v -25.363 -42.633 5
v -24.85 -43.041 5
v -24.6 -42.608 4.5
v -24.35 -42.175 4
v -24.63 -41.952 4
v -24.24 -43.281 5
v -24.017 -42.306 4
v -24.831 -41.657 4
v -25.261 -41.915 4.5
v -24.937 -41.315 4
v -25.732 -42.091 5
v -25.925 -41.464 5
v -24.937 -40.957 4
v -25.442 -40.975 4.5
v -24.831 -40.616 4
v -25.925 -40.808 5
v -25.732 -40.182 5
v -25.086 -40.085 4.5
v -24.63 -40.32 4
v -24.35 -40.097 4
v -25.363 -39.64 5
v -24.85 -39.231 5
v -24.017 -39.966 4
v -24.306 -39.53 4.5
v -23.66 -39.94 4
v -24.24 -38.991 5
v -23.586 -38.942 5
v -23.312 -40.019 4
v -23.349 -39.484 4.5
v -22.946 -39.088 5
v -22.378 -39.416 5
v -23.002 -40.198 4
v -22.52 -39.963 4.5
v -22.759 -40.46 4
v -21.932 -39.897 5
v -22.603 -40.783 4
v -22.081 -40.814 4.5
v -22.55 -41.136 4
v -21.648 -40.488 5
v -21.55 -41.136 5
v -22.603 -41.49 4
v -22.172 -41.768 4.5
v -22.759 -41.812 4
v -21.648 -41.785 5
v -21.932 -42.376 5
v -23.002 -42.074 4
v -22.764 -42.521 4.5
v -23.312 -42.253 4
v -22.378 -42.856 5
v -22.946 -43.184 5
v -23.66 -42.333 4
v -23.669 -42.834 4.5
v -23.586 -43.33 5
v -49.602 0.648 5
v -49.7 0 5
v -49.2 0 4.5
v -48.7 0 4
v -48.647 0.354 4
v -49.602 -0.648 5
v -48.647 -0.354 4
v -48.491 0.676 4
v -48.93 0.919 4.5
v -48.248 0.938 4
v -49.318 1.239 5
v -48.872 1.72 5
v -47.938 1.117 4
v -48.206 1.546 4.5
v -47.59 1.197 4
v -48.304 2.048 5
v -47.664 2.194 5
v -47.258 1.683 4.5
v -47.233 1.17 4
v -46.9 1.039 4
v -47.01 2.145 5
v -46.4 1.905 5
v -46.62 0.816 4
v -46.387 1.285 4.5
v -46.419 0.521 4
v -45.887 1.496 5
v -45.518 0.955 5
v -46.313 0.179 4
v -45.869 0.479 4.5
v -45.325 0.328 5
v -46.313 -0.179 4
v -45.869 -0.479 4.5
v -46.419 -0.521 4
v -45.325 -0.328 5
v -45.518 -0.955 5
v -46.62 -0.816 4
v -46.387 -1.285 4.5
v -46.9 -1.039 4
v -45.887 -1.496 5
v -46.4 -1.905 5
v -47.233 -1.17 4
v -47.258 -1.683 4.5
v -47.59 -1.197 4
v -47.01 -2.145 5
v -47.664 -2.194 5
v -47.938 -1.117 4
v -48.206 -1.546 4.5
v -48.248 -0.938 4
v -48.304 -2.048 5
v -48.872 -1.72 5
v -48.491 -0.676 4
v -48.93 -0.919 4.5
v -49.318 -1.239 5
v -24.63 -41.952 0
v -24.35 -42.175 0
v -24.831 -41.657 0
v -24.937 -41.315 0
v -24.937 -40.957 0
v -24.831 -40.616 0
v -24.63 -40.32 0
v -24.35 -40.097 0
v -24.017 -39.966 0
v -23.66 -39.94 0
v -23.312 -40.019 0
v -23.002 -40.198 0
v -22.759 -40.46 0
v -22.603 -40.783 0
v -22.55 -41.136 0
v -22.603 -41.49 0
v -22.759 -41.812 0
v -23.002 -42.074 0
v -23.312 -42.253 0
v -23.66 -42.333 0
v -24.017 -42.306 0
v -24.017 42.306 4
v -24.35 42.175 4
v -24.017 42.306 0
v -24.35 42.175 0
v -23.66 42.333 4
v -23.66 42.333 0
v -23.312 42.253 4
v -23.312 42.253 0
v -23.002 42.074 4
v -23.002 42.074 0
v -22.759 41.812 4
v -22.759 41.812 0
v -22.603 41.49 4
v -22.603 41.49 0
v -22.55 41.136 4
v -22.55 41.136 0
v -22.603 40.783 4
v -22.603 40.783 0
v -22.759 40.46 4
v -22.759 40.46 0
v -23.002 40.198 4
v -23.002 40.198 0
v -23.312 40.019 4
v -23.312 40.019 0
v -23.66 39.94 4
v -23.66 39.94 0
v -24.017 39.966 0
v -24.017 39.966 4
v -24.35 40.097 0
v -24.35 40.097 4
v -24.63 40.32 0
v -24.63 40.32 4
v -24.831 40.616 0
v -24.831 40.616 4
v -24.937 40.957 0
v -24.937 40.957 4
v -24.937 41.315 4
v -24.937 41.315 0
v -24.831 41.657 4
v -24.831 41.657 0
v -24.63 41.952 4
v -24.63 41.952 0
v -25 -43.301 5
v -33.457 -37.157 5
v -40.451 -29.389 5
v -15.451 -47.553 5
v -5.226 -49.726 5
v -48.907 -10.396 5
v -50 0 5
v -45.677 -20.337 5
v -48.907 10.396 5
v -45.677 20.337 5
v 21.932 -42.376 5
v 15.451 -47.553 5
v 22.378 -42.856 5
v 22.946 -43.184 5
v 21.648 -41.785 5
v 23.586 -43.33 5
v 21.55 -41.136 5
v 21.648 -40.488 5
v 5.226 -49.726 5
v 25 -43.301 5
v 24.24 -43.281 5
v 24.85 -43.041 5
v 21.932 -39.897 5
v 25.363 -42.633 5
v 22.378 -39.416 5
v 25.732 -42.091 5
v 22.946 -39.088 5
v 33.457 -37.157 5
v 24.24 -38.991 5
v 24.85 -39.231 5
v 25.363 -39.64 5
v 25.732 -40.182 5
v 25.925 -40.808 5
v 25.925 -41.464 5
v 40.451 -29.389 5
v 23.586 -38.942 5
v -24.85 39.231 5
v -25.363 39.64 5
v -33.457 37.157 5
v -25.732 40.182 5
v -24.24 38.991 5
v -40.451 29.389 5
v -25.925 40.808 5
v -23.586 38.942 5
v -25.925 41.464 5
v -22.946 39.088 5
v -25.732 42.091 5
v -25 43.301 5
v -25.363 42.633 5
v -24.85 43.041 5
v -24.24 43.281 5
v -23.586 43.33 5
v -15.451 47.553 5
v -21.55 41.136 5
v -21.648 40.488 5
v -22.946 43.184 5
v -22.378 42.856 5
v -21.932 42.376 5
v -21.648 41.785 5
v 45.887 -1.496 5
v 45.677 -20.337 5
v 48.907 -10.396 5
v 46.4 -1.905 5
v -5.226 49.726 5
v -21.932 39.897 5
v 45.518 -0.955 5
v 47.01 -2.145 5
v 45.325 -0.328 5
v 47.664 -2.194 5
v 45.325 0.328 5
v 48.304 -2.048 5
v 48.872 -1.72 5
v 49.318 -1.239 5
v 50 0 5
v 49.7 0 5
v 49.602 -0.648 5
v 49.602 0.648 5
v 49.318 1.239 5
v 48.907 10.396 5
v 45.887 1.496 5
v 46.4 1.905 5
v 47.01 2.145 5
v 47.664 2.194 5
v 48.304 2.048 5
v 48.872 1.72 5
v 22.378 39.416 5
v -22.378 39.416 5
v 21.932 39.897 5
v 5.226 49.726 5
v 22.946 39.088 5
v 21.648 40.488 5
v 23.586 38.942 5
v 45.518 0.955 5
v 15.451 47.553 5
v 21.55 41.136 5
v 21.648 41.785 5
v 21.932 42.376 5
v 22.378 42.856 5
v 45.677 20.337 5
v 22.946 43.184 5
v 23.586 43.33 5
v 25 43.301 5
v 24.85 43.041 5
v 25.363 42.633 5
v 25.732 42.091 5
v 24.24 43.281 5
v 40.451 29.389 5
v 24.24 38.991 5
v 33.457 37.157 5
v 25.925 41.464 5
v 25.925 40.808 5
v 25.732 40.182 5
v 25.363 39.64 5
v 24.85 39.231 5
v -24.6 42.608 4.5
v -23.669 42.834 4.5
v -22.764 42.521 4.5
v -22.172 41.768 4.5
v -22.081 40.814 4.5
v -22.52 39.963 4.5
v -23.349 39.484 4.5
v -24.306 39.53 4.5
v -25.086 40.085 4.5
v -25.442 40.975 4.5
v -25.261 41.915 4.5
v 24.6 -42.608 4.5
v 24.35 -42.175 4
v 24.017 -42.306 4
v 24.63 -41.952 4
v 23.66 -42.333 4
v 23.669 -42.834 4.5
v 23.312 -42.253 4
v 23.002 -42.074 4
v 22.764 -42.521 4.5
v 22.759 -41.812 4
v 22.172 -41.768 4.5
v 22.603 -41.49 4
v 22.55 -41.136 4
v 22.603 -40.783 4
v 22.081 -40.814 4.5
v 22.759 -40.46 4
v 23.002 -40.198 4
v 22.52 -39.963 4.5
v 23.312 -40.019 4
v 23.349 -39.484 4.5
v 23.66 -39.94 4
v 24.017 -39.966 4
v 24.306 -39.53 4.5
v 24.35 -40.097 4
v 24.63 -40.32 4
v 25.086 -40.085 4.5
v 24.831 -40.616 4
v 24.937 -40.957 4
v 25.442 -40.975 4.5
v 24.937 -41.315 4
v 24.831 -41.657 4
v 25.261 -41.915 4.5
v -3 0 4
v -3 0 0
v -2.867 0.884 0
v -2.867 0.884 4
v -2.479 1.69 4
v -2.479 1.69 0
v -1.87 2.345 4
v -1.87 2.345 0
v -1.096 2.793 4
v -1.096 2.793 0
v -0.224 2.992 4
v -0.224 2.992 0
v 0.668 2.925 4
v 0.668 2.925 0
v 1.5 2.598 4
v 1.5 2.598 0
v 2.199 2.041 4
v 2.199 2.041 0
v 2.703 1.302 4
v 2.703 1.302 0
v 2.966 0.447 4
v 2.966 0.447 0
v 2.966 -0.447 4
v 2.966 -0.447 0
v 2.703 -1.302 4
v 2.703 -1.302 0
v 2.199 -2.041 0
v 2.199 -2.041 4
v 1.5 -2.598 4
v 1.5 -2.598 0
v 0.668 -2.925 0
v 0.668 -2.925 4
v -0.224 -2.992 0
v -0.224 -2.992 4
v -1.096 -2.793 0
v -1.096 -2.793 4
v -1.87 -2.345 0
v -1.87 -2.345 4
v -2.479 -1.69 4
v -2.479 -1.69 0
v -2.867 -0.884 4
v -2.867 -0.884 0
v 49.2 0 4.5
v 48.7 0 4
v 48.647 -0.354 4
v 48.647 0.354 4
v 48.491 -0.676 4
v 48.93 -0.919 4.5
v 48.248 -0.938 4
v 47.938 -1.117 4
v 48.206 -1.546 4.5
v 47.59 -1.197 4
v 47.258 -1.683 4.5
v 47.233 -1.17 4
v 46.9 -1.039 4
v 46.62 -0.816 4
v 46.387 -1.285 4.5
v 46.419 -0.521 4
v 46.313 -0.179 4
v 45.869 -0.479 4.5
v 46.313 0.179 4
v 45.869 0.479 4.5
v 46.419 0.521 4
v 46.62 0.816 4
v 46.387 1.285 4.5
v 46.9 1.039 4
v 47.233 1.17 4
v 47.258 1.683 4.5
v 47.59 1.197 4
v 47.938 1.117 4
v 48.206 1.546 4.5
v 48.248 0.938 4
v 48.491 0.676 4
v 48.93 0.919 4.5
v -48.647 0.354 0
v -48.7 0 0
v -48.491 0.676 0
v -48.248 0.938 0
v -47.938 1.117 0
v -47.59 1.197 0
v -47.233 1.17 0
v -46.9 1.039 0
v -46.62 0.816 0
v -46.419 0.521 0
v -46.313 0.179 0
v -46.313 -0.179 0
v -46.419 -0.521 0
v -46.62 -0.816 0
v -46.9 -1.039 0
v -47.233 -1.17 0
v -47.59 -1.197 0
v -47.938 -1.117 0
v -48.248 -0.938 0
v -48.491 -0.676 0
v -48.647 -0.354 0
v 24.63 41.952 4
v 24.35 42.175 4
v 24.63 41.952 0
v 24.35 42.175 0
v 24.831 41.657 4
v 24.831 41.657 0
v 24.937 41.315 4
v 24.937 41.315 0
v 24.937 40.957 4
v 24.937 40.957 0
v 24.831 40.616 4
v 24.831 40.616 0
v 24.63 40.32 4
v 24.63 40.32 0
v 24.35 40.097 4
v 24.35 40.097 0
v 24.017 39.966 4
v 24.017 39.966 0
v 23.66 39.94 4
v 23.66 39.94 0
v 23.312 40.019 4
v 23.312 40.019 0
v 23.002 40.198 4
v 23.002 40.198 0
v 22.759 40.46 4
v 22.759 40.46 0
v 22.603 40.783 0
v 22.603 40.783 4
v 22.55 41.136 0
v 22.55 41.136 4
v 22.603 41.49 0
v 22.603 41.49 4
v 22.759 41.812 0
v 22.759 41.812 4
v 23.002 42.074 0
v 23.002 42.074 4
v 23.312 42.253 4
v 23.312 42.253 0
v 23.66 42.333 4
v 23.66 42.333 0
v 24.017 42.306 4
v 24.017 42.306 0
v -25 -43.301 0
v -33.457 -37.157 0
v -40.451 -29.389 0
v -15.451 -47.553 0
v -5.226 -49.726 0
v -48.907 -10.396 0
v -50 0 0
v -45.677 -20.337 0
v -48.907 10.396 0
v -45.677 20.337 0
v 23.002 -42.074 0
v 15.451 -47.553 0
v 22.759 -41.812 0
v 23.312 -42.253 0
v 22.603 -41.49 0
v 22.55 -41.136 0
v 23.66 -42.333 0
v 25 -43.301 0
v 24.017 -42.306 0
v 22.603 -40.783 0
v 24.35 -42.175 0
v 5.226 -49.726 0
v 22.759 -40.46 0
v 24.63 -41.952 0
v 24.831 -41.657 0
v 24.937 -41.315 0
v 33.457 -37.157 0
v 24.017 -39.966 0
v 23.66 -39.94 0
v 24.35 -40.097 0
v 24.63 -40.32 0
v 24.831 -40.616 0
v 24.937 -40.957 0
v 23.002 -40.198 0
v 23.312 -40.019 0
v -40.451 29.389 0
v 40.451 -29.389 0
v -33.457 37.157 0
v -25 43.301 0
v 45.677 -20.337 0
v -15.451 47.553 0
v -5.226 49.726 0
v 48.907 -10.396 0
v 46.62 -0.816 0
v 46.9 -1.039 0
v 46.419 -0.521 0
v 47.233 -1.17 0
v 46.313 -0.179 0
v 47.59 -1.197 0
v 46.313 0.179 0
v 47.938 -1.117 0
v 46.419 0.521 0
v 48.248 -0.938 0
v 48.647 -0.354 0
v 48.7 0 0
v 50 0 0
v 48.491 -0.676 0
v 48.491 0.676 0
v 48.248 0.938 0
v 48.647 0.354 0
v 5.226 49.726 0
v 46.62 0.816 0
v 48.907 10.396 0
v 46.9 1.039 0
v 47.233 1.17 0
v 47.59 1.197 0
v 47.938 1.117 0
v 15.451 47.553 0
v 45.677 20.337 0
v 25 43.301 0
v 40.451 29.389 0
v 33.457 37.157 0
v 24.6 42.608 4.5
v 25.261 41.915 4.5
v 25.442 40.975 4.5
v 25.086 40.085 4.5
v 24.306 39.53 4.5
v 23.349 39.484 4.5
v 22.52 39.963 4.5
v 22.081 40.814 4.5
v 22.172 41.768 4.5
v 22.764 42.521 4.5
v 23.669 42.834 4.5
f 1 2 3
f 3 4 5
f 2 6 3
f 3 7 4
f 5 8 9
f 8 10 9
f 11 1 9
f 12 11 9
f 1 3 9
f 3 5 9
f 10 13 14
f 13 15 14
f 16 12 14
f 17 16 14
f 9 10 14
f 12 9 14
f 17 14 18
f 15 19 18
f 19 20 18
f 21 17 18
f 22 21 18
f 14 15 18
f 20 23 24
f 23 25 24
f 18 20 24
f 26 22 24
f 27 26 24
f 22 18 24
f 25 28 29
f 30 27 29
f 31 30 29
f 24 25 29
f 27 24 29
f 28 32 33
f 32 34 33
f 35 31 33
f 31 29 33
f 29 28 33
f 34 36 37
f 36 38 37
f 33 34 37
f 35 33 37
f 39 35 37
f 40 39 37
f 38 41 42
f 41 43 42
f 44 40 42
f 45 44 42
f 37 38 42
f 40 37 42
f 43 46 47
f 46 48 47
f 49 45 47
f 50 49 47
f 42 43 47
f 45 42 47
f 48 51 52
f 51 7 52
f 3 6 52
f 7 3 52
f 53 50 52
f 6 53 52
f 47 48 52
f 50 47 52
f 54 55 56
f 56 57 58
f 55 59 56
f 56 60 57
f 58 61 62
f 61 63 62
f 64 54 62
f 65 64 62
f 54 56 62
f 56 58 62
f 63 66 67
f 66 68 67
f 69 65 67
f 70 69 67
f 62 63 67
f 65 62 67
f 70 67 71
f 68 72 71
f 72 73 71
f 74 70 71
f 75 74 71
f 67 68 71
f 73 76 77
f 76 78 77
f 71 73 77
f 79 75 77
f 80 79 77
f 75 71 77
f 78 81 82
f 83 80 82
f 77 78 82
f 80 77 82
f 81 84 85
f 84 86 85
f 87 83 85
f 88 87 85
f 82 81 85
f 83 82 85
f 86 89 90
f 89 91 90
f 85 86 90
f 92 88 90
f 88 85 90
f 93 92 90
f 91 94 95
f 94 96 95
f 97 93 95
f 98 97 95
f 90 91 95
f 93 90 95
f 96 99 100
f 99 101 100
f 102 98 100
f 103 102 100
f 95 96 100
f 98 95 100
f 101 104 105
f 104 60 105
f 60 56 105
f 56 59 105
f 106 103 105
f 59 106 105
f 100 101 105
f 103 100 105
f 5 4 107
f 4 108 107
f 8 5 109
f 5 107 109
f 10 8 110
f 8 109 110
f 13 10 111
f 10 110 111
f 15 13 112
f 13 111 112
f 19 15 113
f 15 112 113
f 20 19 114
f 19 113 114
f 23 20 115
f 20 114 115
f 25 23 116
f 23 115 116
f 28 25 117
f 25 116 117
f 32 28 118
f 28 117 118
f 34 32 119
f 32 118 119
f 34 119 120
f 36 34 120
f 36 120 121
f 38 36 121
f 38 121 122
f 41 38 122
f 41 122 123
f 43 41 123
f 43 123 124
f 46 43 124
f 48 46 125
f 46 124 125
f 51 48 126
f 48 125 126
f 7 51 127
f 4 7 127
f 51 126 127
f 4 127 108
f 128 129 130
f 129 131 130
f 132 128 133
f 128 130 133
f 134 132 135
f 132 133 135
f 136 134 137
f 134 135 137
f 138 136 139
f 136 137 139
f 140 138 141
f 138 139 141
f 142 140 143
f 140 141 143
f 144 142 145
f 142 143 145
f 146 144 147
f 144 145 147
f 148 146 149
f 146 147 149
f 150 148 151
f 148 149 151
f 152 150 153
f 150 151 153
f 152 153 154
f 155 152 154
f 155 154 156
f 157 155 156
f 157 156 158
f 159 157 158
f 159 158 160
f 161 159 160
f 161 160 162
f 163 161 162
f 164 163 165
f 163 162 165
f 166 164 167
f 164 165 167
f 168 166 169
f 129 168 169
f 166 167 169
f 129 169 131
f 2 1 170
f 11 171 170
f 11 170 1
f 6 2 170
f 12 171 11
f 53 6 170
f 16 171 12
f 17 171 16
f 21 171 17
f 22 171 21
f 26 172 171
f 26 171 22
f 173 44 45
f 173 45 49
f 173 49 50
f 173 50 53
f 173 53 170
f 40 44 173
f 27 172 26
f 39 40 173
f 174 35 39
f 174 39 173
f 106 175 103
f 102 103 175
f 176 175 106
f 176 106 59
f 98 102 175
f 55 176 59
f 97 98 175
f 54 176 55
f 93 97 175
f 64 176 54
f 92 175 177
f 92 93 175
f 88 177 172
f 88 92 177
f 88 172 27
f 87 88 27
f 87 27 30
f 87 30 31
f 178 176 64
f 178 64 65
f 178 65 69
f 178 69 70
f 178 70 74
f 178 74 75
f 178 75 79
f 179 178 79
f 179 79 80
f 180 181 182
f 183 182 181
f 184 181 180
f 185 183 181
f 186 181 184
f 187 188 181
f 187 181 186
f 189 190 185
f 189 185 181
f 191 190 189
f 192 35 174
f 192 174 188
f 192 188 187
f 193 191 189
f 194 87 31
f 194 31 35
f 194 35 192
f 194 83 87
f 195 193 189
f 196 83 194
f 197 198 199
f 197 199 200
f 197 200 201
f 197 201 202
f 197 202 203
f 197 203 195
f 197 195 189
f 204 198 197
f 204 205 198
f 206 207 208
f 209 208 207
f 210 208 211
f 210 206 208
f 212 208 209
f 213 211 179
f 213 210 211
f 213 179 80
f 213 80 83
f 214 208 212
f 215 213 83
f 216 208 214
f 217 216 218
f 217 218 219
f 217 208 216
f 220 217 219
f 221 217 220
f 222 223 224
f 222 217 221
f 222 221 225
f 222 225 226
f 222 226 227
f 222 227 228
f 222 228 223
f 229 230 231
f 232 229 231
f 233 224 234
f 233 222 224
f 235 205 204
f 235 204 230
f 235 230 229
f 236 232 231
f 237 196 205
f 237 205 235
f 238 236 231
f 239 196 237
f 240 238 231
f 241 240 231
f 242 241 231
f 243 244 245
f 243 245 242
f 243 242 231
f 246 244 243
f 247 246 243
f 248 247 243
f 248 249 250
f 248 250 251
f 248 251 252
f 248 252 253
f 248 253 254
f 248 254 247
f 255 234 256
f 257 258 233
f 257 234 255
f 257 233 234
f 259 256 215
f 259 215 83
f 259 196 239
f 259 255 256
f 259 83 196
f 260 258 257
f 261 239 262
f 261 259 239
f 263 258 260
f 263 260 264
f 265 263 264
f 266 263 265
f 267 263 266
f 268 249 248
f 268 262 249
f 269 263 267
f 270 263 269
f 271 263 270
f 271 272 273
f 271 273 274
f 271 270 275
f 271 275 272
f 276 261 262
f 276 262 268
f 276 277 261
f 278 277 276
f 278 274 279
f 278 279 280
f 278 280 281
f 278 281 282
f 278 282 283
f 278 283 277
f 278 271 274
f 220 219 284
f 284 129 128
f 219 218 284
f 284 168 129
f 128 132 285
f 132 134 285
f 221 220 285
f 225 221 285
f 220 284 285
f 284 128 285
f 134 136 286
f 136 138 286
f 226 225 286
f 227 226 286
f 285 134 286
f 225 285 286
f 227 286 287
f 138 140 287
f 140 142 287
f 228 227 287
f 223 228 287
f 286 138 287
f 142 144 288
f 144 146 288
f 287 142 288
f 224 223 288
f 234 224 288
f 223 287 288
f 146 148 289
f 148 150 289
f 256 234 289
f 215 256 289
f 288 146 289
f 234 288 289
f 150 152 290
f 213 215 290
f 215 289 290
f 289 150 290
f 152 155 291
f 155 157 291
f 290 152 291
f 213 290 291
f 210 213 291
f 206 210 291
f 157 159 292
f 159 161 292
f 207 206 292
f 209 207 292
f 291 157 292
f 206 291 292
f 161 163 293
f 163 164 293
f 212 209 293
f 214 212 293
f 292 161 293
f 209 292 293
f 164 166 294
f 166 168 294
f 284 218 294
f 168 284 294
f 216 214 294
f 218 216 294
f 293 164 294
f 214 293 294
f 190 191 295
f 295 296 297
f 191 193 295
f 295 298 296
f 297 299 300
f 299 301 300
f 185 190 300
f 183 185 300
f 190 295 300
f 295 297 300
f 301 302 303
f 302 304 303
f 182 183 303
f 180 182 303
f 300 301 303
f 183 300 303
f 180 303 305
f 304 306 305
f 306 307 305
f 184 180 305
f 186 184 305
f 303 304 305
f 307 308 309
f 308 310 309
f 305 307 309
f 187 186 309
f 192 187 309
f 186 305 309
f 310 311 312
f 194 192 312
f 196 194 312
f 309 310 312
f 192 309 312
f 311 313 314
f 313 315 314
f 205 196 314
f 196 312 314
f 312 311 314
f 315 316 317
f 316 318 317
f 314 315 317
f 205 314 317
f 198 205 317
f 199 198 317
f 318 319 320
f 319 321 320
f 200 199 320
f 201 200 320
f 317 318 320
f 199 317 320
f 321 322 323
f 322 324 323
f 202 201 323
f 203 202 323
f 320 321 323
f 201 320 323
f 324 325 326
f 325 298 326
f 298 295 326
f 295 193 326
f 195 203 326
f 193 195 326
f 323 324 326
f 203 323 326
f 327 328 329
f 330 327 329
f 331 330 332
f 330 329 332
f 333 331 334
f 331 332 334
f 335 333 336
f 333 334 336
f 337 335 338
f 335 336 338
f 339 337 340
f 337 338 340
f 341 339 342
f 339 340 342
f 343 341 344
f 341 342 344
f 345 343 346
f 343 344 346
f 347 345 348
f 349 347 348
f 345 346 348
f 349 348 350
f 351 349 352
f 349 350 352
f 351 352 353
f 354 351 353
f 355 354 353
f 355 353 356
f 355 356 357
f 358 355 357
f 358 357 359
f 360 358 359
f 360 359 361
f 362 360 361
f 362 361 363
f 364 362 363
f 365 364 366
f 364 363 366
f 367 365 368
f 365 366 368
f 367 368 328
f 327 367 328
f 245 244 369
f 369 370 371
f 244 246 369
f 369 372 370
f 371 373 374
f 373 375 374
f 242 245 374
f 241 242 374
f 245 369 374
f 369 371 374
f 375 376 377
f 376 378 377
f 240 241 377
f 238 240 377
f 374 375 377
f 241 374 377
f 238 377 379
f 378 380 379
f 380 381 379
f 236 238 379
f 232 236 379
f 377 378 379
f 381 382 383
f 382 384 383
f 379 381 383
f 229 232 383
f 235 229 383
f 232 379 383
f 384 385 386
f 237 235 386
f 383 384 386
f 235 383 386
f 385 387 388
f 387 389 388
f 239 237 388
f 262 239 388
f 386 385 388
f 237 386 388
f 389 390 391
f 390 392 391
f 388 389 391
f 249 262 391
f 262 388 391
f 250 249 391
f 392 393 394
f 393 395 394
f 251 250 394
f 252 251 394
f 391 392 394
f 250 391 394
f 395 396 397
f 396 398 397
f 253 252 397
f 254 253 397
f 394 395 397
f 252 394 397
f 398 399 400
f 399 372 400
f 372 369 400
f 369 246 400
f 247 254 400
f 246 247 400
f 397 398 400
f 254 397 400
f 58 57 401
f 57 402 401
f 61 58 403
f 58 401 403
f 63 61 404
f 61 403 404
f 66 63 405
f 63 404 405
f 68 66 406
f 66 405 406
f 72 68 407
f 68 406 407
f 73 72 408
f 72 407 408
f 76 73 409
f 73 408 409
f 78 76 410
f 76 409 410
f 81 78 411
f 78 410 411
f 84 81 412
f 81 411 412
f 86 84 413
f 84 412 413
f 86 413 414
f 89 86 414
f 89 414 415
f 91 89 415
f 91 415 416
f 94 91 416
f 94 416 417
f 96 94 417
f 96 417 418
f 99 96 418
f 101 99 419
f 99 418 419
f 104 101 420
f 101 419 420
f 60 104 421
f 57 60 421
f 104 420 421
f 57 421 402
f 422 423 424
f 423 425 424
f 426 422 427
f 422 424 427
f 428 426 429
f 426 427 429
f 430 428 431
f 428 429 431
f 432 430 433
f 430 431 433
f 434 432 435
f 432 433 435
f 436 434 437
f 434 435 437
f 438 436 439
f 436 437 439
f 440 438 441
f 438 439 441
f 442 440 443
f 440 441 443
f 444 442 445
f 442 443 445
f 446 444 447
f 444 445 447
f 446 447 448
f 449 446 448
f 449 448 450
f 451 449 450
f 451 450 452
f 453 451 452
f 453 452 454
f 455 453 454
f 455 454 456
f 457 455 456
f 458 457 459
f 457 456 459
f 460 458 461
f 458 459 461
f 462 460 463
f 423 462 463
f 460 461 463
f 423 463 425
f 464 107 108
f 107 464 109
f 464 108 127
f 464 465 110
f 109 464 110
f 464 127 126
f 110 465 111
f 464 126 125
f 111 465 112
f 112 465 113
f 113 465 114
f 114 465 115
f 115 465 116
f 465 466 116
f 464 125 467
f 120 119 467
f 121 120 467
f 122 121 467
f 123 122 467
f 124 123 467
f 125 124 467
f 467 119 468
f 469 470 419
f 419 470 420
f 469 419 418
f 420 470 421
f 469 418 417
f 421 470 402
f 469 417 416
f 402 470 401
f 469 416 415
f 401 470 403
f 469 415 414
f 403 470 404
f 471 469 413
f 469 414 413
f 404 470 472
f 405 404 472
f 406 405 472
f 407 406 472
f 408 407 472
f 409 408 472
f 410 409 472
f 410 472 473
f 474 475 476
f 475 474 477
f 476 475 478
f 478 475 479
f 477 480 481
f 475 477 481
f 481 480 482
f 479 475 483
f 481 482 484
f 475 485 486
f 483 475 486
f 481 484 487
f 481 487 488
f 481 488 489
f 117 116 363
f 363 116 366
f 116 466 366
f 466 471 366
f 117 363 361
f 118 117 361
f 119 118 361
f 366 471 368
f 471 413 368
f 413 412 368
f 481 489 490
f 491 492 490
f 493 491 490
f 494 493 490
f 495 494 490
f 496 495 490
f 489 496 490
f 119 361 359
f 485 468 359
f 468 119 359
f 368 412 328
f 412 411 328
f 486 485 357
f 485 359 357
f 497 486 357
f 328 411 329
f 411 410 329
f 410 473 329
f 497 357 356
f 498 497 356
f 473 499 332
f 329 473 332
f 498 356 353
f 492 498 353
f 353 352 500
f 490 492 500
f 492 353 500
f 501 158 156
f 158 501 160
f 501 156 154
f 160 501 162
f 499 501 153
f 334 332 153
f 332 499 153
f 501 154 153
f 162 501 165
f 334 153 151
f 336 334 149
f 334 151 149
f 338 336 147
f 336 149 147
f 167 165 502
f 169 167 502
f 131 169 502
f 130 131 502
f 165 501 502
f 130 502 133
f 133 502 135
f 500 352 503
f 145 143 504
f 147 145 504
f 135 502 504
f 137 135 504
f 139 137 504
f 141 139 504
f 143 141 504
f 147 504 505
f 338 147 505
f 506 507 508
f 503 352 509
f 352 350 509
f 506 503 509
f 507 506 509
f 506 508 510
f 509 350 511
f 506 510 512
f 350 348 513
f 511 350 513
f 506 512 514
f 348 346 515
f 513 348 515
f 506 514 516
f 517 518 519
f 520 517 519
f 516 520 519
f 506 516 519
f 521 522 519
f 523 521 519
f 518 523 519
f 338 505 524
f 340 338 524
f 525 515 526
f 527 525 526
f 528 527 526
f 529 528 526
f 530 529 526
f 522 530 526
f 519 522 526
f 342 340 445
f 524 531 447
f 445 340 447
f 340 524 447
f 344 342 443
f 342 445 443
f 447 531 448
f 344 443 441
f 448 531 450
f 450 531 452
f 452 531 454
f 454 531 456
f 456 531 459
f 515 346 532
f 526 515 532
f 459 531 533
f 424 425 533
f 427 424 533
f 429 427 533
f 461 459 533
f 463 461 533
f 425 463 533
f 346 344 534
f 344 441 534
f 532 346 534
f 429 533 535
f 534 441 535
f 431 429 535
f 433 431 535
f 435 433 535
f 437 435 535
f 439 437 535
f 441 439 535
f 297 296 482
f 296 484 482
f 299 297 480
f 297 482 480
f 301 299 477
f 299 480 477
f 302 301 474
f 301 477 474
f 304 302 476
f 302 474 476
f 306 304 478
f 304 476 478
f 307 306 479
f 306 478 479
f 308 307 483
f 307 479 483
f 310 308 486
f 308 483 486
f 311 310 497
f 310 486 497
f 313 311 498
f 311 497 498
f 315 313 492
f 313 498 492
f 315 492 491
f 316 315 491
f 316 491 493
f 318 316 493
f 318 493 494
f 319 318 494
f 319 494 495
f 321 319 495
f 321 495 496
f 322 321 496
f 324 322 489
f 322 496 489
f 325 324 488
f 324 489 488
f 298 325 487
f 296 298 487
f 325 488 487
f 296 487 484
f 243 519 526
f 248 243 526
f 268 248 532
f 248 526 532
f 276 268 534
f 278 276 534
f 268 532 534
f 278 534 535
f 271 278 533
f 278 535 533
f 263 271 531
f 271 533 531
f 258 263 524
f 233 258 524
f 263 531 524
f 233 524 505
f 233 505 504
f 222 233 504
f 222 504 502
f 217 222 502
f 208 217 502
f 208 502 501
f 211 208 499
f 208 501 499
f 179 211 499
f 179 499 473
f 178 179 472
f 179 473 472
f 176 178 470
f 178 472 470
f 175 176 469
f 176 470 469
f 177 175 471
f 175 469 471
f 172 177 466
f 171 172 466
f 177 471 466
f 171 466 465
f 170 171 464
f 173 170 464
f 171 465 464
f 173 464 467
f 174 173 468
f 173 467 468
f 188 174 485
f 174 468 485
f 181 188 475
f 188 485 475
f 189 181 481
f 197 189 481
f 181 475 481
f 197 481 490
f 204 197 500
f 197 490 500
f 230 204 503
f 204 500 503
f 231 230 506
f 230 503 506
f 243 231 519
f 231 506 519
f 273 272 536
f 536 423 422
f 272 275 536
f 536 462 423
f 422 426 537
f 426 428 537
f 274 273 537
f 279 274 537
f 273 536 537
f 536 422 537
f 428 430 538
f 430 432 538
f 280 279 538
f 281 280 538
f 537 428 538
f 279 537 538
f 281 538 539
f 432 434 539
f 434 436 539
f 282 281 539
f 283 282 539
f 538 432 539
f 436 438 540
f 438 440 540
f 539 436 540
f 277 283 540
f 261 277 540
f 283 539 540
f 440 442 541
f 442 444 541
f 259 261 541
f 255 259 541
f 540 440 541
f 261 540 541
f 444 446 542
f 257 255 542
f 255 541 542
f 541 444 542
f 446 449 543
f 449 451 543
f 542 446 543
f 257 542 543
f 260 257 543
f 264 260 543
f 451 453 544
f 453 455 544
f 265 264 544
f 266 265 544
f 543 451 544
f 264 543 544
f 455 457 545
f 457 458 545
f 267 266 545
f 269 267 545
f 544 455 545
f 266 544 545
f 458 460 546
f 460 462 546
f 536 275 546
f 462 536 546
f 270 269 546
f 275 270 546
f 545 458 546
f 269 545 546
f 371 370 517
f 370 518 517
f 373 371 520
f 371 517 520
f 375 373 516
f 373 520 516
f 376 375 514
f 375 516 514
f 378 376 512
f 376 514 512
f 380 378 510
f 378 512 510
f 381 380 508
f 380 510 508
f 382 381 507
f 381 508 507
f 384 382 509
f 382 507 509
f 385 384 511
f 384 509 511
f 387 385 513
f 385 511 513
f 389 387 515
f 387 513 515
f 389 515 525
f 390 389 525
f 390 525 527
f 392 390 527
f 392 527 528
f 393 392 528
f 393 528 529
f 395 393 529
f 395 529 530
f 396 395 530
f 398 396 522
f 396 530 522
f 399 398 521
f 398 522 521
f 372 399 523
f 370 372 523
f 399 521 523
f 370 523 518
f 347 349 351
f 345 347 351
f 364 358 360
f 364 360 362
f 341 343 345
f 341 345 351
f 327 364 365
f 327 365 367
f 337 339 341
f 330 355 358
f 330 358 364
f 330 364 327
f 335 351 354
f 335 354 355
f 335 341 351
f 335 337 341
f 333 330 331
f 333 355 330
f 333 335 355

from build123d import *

# Parameters (mm, degrees)
SKETCH1_R                                       = 50
BOSS_EXTRUDE1_DEPTH                             = 5
SKETCH3_R                                       = 3
CUT_EXTRUDE2_DEPTH                              = 4
CSK_FOR_M2_FLAT_HEAD_MACHINE_SCREW1_D           = 2.4
CSK_FOR_M2_FLAT_HEAD_MACHINE_SCREW1_CSINK_D     = 4.4
CSK_FOR_M2_FLAT_HEAD_MACHINE_SCREW1_CSINK_ANGLE = 90
CIRPATTERN1_COUNT                               = 6


with BuildPart() as part:
    # Sketch1 → Boss-Extrude1 (new body)
    with BuildSketch(Plane.XY):
        Circle(SKETCH1_R)
    extrude(amount=BOSS_EXTRUDE1_DEPTH)

    # Sketch3 → Cut-Extrude2 (cut)
    with BuildSketch(Plane(origin=(0, 0, 0), x_dir=(-1, 0, 0), z_dir=(0, 0, -1))):
        Circle(SKETCH3_R)
    extrude(amount=-CUT_EXTRUDE2_DEPTH, mode=Mode.SUBTRACT)

    # CSK for M2 Flat Head Machine Screw1 (through all)
    with Locations(Plane(origin=(-47.5, 0, 5), x_dir=(1, 0, 0), z_dir=(0, 0, 1))):
        with Locations((0, 0)):
            csk_for_m2_flat_head_machine_screw1 = CounterSinkHole(CSK_FOR_M2_FLAT_HEAD_MACHINE_SCREW1_D / 2, CSK_FOR_M2_FLAT_HEAD_MACHINE_SCREW1_CSINK_D / 2, counter_sink_angle=CSK_FOR_M2_FLAT_HEAD_MACHINE_SCREW1_CSINK_ANGLE)

    # CirPattern1: CSK for M2 Flat Head Machine Screw1 ×6 about axis
    cirpattern1_axis = Axis((0, 0, 0), (0, 0, 1))
    for i in range(1, CIRPATTERN1_COUNT):
        add(csk_for_m2_flat_head_machine_screw1.rotate(cirpattern1_axis, i * 360 / CIRPATTERN1_COUNT), mode=Mode.SUBTRACT)


solid = part.part
